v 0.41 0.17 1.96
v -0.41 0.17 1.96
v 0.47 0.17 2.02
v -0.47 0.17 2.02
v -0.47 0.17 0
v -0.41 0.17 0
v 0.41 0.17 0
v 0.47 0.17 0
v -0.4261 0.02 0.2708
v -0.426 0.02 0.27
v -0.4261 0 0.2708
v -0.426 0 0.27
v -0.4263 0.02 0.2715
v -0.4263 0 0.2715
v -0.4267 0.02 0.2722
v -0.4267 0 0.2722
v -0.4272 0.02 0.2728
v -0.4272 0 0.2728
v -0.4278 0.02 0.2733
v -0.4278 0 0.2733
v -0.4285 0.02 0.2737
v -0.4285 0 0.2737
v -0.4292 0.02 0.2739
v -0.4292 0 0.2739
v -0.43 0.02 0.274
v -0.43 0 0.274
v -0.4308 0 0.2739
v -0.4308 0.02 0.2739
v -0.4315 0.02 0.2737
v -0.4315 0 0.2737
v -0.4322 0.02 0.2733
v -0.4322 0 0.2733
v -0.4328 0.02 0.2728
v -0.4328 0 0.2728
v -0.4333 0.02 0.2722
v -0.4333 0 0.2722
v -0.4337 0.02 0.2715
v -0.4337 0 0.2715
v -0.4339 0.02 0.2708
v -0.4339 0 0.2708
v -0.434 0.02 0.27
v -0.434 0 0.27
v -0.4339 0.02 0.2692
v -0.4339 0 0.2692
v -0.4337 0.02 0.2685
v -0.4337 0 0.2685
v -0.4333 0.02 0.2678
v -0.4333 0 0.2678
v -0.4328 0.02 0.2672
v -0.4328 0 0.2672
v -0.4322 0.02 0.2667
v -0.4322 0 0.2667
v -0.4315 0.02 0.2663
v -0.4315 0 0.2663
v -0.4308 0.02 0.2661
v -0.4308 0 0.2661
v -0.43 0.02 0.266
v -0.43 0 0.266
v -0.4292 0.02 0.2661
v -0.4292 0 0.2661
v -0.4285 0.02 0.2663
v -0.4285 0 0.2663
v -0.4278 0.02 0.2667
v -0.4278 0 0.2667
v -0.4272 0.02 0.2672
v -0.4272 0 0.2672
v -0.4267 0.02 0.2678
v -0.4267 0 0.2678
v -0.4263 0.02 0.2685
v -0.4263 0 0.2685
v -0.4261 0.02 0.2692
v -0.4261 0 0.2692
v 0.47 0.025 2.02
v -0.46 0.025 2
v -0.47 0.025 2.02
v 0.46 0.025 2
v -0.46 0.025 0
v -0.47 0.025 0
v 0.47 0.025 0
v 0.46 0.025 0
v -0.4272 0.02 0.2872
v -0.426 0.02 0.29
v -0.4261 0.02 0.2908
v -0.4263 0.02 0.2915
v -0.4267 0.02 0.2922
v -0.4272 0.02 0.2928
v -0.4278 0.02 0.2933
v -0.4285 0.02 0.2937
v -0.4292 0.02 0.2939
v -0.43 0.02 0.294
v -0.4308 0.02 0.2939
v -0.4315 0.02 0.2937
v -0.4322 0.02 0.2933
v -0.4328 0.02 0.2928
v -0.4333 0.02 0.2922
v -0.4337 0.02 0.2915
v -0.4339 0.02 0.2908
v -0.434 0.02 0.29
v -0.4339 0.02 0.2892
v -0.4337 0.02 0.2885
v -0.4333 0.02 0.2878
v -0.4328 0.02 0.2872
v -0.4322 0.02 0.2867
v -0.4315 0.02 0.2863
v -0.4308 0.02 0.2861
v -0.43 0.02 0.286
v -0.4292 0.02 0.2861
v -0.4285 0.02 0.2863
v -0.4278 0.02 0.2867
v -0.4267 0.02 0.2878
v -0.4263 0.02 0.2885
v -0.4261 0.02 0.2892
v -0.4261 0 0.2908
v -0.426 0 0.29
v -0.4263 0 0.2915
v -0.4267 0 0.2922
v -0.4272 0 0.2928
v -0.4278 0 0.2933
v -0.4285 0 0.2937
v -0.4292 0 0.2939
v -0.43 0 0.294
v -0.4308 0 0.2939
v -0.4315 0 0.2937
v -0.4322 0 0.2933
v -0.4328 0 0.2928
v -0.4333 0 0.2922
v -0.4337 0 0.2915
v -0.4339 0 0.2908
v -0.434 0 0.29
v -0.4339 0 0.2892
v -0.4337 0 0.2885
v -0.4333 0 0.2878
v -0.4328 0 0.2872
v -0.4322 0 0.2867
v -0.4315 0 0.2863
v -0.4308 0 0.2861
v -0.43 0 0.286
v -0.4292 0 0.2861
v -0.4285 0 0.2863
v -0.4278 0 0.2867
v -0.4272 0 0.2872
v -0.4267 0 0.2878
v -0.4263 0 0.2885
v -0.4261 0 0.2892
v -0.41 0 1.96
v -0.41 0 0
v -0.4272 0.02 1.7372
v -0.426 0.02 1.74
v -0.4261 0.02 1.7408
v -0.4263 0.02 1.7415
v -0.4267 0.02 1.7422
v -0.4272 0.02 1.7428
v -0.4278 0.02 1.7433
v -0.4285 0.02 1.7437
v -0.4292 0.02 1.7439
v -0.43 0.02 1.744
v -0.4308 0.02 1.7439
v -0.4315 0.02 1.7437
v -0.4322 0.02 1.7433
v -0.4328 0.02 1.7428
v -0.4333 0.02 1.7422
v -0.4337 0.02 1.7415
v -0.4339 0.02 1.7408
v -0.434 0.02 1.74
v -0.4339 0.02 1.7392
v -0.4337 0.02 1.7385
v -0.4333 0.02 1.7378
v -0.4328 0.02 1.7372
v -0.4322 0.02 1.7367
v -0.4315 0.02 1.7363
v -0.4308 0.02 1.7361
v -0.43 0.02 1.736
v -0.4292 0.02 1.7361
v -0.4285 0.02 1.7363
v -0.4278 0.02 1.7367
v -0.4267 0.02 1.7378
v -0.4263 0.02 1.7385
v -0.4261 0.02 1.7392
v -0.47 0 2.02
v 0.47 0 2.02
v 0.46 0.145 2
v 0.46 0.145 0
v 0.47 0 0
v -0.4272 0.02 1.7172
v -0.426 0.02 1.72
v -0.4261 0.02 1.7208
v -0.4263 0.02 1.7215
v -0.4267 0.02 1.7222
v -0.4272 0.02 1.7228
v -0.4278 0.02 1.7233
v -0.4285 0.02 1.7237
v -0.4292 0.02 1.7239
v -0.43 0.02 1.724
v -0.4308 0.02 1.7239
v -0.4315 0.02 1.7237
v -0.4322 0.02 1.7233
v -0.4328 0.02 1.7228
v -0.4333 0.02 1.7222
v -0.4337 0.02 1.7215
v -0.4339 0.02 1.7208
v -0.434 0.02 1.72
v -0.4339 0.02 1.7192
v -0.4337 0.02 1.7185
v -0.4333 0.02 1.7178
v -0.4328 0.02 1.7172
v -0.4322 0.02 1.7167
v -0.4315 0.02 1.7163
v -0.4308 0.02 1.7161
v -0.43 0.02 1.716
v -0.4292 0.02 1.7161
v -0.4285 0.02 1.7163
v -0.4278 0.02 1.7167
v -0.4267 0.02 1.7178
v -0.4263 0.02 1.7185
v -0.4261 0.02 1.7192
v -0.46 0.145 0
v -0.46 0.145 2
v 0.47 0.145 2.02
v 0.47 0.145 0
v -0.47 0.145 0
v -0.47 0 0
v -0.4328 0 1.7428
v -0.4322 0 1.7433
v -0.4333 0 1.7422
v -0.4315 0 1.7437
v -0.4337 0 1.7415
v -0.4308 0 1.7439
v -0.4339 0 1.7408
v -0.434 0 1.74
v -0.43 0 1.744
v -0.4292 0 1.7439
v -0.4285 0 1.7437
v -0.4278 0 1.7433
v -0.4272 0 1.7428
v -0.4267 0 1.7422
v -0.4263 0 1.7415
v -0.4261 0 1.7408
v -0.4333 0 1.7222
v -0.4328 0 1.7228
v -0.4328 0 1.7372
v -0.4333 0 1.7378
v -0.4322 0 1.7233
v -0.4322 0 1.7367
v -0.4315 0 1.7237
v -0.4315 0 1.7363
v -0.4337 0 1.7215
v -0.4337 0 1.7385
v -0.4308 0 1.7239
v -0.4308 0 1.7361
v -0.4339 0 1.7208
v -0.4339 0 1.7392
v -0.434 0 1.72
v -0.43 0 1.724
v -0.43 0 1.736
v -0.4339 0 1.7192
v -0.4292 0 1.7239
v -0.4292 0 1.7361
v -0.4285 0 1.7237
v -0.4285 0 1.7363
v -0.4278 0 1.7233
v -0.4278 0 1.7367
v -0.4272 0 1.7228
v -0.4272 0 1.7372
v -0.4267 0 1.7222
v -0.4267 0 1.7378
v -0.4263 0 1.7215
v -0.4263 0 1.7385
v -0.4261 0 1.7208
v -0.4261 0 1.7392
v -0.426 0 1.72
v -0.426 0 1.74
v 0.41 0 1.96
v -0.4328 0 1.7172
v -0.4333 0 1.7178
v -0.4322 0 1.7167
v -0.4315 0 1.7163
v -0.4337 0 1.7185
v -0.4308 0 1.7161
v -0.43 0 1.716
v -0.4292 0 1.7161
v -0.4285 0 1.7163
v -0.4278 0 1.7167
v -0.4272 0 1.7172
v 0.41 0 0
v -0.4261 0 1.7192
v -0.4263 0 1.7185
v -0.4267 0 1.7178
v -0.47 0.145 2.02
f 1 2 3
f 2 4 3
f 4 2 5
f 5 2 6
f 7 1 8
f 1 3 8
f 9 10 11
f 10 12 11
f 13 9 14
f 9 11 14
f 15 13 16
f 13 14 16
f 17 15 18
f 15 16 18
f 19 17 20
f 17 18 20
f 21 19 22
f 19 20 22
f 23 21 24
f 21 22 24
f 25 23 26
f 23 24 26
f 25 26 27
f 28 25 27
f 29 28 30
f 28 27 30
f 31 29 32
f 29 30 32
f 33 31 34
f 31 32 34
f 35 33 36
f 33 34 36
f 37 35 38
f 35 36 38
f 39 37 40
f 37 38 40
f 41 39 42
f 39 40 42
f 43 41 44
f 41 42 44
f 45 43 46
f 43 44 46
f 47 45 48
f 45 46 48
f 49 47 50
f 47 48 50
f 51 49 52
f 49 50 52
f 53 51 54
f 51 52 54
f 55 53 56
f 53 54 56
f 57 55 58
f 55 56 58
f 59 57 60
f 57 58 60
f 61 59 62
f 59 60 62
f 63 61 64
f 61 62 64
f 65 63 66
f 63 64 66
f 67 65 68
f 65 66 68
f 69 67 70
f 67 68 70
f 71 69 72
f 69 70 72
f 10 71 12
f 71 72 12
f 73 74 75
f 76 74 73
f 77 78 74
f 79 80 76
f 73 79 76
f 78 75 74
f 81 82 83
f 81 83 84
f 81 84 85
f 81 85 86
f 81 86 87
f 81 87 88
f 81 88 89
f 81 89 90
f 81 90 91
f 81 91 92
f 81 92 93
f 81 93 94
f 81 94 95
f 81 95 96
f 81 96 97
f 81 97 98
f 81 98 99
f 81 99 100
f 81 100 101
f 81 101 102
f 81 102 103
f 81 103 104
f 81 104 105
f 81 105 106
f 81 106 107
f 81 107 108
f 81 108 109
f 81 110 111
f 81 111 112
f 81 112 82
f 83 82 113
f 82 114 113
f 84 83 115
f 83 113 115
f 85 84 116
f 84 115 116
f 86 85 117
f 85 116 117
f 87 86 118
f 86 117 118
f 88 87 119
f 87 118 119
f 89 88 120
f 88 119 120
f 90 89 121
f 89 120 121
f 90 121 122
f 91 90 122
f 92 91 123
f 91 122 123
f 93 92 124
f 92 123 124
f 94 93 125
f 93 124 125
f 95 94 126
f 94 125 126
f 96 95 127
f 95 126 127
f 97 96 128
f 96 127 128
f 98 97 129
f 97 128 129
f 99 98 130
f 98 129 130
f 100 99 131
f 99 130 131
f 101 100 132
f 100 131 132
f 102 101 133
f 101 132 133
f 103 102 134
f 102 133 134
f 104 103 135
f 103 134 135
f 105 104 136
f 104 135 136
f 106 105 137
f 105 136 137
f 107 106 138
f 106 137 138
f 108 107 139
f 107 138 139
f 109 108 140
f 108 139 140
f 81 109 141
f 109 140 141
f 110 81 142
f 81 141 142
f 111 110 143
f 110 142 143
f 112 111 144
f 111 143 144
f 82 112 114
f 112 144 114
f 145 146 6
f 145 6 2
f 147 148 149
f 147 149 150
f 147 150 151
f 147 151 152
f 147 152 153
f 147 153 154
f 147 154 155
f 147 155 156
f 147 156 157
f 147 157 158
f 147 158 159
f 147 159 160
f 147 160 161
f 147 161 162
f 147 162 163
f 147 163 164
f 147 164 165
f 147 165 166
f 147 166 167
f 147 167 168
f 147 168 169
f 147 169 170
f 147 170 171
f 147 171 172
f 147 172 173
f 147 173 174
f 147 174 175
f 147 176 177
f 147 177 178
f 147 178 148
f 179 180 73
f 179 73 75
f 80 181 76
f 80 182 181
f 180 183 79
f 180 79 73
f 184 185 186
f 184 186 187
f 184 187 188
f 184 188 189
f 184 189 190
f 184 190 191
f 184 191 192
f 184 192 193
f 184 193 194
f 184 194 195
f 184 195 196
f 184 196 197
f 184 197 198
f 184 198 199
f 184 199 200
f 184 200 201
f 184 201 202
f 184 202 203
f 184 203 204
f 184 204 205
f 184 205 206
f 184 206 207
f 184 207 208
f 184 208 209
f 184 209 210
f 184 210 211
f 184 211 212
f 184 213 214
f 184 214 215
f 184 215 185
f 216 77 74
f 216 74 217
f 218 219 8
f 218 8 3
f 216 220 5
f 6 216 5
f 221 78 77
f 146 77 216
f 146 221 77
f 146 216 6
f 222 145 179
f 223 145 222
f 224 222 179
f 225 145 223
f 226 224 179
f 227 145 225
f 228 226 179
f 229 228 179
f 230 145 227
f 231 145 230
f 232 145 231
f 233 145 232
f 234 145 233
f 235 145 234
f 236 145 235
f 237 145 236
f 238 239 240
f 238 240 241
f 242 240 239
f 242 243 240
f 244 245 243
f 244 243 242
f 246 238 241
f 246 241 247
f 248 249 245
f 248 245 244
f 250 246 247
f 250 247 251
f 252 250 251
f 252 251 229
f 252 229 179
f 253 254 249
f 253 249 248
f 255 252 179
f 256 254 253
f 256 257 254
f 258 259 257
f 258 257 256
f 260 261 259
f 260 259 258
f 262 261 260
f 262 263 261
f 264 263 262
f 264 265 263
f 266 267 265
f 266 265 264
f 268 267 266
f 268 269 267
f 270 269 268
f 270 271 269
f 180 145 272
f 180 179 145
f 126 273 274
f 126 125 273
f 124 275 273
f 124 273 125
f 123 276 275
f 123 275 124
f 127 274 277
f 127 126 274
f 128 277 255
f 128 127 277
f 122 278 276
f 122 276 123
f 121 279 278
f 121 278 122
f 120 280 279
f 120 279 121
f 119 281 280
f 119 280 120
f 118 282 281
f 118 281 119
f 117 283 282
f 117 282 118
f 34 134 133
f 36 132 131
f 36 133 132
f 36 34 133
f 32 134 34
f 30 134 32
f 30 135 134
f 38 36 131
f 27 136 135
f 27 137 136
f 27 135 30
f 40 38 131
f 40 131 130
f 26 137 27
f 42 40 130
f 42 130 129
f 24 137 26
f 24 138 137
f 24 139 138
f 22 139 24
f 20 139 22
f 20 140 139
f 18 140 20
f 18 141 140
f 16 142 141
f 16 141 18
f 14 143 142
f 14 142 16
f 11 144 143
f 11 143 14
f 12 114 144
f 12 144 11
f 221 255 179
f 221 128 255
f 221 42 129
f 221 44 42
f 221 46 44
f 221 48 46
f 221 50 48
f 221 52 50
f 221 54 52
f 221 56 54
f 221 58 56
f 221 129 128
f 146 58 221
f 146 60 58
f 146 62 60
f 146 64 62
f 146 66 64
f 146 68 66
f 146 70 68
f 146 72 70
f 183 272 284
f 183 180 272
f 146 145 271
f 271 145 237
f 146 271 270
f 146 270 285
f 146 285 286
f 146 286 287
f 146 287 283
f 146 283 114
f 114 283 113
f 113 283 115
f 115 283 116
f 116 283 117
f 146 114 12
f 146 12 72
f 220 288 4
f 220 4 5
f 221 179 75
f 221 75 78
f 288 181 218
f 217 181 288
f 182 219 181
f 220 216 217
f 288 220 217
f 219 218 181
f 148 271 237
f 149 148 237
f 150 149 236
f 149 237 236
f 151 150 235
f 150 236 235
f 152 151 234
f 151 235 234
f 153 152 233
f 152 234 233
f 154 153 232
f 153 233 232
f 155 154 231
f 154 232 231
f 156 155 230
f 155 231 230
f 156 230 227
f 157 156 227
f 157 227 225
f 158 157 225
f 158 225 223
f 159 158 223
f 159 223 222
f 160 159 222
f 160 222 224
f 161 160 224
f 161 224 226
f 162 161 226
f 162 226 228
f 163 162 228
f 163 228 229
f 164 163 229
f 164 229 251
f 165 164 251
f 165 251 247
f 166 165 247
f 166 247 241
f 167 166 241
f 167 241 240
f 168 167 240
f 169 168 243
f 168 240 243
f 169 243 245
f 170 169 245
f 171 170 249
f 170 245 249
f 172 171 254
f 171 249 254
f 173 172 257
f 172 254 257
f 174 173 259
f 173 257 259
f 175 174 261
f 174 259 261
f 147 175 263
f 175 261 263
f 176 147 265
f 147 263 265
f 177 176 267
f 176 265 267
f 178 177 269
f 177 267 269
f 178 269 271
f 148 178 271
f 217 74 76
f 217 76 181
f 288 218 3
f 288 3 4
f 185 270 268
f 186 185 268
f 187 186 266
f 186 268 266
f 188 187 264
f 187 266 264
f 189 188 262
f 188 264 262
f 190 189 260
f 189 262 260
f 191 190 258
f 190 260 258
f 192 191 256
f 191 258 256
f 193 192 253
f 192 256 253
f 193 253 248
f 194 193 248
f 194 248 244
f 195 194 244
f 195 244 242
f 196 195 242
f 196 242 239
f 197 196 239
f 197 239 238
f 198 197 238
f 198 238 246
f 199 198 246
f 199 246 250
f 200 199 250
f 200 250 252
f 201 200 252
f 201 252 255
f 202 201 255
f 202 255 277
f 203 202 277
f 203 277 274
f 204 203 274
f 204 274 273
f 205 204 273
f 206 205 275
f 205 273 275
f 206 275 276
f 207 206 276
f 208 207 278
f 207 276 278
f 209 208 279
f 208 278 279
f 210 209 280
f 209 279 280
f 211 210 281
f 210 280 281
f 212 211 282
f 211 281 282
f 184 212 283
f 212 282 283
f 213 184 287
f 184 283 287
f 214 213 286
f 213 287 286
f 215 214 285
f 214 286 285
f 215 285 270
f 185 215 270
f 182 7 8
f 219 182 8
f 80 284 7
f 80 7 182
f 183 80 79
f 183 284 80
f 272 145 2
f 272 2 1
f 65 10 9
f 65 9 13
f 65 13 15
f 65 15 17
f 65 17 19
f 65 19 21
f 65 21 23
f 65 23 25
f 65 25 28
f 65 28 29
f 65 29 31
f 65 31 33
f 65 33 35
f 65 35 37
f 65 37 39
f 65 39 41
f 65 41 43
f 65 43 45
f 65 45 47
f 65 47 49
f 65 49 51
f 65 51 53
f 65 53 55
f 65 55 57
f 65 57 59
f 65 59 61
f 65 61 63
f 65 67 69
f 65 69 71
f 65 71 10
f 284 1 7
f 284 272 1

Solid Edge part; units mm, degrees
sketch "Sketch1" plane through (0, 0, 0) normal (0, -1, 0) x (1, 0, 0)
  line L0 (-0.47, 0) -> (0.47, 0)
  line L1 (0.47, 0) -> (0.47, 2.02)
  line L2 (0.47, 2.02) -> (-0.47, 2.02)
  line L3 (-0.47, 2.02) -> (-0.47, 0)
  dimension "D1" = 2.02
  dimension "D2" = 0.94
extrude "Protrusion1" add sketch "Sketch1" against normal blind 0.17
sketch "Sketch2" plane through (0, 0.085, 0) normal (0, 0, -1) x (1, 0, 0)
  line L0 (-0.47, -0.06) -> (-0.47, 0.06)
  line L1 (-0.47, 0.06) -> (-0.46, 0.06)
  line L2 (-0.46, 0.06) -> (-0.46, -0.06)
  line L3 (-0.46, -0.06) -> (-0.47, -0.06)
  dimension "D1" = 0.12
  dimension "D2" = 0.01
extrude "Cutout1" cut sketch "Sketch2" against normal through all
mirror "Mirror1" about plane through (0, 0, 0) normal (1, 0, 0) of "Cutout1"
sketch "Sketch3" plane through (0, 0, 0) normal (1, 0, 0) x (0, 1, 0)
  line L0 (0.025, 2.02) -> (0.025, 2)
  line L1 (0.025, 2) -> (0.145, 2)
  line L2 (0.145, 2.02) -> (0.145, 2)
  line L3 (0.145, 2.02) -> (0.025, 2.02)
  dimension "D1" = 0.02
extrude "Cutout3" cut sketch "Sketch3" along normal through all and the other way through all
sketch "Sketch4" plane through (0, 0, 1.01) normal (0, -1, 0) x (1, 0, 0)
  line L0 (-0.41, -1.01) -> (0.41, -1.01)
  line L1 (0.41, 0.95) -> (0.41, -1.01)
  line L2 (-0.41, 0.95) -> (0.41, 0.95)
  line L3 (-0.41, -1.01) -> (-0.41, 0.95)
  dimension "D1" = 0.82
  dimension "D2" = 1.96
extrude "Cutout4" cut sketch "Sketch4" against normal through all
sketch "Sketch5" plane through (0, 0, 1.01) normal (0, -1, 0) x (1, 0, 0)
  circle A0 centre (-0.43, -0.72) radius 0.004
  circle A1 centre (-0.43, 0.71) radius 0.004
  circle A2 centre (-0.43, 0.73) radius 0.004
  circle A3 centre (-0.43, -0.74) radius 0.004
  dimension "D1" = 0.008
  dimension "D2" = 0.27
  dimension "D3" = 0.02
  dimension "D4" = 1.45
  dimension "D5" = 0.02
extrude "Ausschnitt_5" cut sketch "Sketch5" against normal blind 0.02
